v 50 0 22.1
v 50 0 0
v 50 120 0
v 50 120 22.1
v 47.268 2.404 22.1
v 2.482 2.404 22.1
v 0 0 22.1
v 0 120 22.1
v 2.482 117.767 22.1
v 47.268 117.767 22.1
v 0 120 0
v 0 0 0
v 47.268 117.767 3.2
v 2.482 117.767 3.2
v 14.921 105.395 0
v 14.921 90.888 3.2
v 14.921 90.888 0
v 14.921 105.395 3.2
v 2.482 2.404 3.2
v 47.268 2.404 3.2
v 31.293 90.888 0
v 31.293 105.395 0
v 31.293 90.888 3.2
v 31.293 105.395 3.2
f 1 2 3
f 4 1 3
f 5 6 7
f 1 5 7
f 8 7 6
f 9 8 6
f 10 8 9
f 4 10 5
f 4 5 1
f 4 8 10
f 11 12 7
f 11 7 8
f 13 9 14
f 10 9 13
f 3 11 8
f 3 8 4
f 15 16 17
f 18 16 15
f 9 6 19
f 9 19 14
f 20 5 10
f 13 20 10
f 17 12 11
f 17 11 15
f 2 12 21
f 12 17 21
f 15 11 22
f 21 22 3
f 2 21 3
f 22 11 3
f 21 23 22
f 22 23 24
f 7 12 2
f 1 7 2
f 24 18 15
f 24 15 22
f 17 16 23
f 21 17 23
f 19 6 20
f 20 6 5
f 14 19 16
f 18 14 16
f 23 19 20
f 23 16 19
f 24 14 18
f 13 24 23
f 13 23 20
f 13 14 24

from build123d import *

# Parameters (mm, degrees)
F0_W     = 50
F0_H     = 120
F1_DEPTH = 22.1
F2_W     = 44.786031
F2_H     = 115.363243
F3_DEPTH = 18.9
F4_W     = 16.371712
F4_H     = 14.506579
F5_DEPTH = 3.2


with BuildPart() as f1:
    # F0 (on Top) → F1 (new body)
    with BuildSketch(Plane.XY):
        with Locations((25, 60)):
            Rectangle(F0_W, F0_H)
    extrude(amount=F1_DEPTH)

    # F2 (on face) → F3 (cut)
    with BuildSketch(Plane.XY.offset(22.1)):
        with Locations((24.874761, 60.085734)):
            Rectangle(F2_W, F2_H)
    extrude(amount=-F3_DEPTH, mode=Mode.SUBTRACT)

    # F4 (on face) → F5 (cut, through all)
    with BuildSketch(Plane.XY.offset(3.2)):
        with Locations((23.106907, 98.141447)):
            Rectangle(F4_W, F4_H)
    extrude(amount=-F5_DEPTH, mode=Mode.SUBTRACT)


solid = f1.part
